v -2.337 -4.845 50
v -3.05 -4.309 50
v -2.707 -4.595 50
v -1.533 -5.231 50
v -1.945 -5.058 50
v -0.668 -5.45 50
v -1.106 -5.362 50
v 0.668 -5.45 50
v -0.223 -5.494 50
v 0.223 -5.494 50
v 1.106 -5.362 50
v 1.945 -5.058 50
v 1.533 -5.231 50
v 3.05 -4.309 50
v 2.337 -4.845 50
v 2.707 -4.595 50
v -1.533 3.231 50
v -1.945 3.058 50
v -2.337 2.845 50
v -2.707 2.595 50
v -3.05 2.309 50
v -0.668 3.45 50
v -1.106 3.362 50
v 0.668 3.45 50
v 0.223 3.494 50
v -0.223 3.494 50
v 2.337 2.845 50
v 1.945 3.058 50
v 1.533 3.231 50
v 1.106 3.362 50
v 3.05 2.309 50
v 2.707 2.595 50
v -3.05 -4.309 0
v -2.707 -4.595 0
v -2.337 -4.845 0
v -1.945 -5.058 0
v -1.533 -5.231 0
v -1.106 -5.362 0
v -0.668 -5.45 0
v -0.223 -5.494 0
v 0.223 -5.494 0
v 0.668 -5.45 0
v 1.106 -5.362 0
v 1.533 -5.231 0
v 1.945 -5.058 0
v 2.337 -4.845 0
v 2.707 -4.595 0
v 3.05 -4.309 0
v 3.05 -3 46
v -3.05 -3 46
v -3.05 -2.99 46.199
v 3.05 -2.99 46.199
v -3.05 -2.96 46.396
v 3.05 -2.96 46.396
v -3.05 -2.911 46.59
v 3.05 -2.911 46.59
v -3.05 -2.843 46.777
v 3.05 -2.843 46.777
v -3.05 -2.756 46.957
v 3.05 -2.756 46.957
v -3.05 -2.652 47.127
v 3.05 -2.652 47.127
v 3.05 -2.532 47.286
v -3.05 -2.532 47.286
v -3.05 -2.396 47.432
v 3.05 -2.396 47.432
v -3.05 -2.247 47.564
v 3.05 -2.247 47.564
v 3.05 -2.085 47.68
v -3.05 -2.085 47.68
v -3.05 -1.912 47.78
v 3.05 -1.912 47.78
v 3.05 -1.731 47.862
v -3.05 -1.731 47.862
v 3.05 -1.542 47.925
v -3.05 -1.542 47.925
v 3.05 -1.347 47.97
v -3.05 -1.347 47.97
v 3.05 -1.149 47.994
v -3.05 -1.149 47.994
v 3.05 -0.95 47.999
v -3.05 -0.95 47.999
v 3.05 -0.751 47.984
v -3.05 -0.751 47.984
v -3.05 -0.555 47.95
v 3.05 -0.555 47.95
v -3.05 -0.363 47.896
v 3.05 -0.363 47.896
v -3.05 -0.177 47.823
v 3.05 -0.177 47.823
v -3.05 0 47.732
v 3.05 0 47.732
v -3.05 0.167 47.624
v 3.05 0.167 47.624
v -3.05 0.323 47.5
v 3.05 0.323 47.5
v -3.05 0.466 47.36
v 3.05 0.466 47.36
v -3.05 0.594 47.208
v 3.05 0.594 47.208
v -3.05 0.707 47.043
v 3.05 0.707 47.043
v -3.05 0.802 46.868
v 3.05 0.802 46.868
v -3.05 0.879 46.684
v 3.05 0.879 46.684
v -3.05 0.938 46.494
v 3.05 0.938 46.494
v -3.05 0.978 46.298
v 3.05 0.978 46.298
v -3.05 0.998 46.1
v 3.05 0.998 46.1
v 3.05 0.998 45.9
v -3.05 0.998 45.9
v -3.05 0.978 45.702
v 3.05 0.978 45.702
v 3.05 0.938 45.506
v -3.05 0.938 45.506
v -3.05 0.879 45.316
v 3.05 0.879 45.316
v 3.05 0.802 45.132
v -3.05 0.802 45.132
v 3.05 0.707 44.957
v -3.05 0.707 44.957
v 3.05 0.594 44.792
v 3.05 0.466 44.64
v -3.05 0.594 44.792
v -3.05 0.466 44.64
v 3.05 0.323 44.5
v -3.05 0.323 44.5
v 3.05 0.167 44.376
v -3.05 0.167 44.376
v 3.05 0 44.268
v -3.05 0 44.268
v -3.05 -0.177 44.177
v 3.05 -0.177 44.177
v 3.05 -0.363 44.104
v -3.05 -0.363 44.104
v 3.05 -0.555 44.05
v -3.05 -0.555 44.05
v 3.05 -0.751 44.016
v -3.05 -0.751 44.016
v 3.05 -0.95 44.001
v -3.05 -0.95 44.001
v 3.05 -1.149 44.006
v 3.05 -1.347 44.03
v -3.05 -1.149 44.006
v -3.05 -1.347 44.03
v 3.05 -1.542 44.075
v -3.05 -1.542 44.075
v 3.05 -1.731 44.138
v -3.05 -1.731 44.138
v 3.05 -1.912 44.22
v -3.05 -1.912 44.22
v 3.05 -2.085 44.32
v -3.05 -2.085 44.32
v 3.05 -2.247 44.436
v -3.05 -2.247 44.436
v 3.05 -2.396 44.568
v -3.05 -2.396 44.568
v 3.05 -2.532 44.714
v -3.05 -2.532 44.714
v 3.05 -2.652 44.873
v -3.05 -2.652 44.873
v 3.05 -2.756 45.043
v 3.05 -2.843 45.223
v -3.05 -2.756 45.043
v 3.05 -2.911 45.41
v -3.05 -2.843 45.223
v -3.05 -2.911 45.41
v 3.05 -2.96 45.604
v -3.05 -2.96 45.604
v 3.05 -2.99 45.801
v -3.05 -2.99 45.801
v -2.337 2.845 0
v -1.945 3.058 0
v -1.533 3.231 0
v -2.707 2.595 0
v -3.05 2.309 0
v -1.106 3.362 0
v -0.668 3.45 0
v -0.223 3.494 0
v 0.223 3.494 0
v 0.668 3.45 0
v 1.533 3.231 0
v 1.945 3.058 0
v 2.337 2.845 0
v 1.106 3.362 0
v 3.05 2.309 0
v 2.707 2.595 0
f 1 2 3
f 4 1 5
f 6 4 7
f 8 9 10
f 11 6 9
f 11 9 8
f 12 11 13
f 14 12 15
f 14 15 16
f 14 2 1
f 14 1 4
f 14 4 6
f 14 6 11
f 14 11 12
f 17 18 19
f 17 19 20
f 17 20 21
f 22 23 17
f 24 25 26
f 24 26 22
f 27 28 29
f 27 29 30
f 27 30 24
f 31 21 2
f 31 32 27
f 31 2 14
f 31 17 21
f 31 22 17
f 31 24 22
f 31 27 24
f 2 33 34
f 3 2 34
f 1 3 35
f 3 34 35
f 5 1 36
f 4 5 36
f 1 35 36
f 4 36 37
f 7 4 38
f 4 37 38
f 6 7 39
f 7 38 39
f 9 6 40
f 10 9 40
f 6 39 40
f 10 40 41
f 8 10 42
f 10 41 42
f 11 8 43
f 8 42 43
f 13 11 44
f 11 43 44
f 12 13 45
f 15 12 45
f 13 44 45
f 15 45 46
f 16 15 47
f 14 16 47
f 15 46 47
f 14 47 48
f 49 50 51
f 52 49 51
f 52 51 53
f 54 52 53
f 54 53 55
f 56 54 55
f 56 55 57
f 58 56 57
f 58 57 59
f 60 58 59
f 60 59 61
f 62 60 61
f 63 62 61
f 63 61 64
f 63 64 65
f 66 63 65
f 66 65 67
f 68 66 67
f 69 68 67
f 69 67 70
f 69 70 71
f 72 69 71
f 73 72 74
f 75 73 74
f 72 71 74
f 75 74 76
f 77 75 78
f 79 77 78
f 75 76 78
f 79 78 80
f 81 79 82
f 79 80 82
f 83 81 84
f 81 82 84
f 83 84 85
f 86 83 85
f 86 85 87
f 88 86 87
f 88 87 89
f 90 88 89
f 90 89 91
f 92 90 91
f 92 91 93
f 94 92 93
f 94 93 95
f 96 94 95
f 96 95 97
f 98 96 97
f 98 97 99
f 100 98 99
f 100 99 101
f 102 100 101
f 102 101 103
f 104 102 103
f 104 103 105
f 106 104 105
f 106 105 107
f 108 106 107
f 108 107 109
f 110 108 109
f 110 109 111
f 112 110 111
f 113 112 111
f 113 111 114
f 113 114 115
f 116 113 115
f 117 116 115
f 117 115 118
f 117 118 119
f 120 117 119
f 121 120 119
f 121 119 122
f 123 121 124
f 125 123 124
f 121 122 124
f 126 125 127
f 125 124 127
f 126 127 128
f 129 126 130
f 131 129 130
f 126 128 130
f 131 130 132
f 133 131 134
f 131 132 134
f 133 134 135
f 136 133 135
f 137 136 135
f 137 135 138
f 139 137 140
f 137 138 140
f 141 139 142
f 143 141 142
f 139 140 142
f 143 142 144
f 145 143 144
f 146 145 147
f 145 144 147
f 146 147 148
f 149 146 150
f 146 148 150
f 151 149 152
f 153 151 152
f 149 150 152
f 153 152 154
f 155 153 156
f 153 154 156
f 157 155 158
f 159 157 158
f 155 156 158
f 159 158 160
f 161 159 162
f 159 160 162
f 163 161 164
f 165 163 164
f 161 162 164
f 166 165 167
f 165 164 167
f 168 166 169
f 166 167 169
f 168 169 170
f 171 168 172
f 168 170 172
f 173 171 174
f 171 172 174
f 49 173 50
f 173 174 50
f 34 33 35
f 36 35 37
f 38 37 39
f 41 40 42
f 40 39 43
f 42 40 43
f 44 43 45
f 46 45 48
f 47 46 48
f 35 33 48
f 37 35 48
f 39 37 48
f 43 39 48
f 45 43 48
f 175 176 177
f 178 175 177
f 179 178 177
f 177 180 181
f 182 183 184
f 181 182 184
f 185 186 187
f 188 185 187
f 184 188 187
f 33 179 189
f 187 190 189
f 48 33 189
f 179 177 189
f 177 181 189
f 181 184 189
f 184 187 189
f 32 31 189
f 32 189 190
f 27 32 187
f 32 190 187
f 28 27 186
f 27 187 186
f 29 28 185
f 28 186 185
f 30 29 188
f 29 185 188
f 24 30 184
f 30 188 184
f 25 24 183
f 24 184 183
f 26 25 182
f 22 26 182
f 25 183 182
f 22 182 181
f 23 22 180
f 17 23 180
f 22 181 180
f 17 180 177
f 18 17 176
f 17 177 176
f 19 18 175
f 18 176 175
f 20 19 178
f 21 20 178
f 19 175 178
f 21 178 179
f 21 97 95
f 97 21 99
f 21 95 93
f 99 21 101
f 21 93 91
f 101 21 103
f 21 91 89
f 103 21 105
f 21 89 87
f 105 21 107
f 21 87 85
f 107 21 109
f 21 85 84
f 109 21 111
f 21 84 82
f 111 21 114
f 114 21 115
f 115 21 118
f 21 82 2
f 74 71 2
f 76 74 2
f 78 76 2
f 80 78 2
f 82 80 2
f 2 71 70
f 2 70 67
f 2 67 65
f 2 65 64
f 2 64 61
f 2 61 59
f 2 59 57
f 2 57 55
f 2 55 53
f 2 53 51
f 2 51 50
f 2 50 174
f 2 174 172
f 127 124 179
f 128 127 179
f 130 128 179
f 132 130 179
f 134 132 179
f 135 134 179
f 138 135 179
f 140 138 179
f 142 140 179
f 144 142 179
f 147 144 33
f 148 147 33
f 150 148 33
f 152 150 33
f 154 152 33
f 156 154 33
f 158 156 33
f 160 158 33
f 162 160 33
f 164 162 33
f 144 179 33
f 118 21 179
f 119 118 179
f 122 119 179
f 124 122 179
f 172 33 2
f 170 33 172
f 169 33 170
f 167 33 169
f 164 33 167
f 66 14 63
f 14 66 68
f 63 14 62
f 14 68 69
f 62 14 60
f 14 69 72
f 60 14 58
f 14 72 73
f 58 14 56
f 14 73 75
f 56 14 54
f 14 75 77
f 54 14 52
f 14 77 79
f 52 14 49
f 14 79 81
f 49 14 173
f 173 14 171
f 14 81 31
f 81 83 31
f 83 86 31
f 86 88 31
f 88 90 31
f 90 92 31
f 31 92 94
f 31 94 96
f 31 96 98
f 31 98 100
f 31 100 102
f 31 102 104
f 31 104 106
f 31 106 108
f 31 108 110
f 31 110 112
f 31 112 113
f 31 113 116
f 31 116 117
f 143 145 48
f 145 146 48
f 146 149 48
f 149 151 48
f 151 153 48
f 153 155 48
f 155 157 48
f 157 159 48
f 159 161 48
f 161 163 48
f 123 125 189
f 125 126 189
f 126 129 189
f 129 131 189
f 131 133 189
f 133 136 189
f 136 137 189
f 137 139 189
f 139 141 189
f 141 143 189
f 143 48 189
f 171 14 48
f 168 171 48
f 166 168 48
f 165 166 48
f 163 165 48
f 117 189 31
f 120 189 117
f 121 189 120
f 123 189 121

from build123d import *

# Parameters (mm, degrees)
EXTRUDE_1_DEPTH     = 50
SKETCH_2_R          = 2
CUT_EXTRUDE_1_DEPTH = 51.670109532


with BuildPart() as part:
    # Эскиз1 → Бобышка-Вытянуть1 (new body)
    with BuildSketch(Plane.XY):
        with BuildLine():
            Line((-3.05, 2.308700651), (-3.05, -4.308700651))
            ThreePointArc((-3.05, -4.308700651), (0, -5.5), (3.05, -4.308700651))
            Line((3.05, -4.308700651), (3.05, 2.308700651))
            ThreePointArc((3.05, 2.308700651), (0, 3.5), (-3.05, 2.308700651))
        make_face()
    extrude(amount=EXTRUDE_1_DEPTH)

    # Эскиз2 → Вырез-Вытянуть1 (cut, through all)
    with BuildSketch(Plane.ZY.offset(3.05)):
        with Locations(Location((46, -1, 0), (0, 0, 270))):
            Circle(SKETCH_2_R)
    extrude(amount=-CUT_EXTRUDE_1_DEPTH, mode=Mode.SUBTRACT)


solid = part.part
